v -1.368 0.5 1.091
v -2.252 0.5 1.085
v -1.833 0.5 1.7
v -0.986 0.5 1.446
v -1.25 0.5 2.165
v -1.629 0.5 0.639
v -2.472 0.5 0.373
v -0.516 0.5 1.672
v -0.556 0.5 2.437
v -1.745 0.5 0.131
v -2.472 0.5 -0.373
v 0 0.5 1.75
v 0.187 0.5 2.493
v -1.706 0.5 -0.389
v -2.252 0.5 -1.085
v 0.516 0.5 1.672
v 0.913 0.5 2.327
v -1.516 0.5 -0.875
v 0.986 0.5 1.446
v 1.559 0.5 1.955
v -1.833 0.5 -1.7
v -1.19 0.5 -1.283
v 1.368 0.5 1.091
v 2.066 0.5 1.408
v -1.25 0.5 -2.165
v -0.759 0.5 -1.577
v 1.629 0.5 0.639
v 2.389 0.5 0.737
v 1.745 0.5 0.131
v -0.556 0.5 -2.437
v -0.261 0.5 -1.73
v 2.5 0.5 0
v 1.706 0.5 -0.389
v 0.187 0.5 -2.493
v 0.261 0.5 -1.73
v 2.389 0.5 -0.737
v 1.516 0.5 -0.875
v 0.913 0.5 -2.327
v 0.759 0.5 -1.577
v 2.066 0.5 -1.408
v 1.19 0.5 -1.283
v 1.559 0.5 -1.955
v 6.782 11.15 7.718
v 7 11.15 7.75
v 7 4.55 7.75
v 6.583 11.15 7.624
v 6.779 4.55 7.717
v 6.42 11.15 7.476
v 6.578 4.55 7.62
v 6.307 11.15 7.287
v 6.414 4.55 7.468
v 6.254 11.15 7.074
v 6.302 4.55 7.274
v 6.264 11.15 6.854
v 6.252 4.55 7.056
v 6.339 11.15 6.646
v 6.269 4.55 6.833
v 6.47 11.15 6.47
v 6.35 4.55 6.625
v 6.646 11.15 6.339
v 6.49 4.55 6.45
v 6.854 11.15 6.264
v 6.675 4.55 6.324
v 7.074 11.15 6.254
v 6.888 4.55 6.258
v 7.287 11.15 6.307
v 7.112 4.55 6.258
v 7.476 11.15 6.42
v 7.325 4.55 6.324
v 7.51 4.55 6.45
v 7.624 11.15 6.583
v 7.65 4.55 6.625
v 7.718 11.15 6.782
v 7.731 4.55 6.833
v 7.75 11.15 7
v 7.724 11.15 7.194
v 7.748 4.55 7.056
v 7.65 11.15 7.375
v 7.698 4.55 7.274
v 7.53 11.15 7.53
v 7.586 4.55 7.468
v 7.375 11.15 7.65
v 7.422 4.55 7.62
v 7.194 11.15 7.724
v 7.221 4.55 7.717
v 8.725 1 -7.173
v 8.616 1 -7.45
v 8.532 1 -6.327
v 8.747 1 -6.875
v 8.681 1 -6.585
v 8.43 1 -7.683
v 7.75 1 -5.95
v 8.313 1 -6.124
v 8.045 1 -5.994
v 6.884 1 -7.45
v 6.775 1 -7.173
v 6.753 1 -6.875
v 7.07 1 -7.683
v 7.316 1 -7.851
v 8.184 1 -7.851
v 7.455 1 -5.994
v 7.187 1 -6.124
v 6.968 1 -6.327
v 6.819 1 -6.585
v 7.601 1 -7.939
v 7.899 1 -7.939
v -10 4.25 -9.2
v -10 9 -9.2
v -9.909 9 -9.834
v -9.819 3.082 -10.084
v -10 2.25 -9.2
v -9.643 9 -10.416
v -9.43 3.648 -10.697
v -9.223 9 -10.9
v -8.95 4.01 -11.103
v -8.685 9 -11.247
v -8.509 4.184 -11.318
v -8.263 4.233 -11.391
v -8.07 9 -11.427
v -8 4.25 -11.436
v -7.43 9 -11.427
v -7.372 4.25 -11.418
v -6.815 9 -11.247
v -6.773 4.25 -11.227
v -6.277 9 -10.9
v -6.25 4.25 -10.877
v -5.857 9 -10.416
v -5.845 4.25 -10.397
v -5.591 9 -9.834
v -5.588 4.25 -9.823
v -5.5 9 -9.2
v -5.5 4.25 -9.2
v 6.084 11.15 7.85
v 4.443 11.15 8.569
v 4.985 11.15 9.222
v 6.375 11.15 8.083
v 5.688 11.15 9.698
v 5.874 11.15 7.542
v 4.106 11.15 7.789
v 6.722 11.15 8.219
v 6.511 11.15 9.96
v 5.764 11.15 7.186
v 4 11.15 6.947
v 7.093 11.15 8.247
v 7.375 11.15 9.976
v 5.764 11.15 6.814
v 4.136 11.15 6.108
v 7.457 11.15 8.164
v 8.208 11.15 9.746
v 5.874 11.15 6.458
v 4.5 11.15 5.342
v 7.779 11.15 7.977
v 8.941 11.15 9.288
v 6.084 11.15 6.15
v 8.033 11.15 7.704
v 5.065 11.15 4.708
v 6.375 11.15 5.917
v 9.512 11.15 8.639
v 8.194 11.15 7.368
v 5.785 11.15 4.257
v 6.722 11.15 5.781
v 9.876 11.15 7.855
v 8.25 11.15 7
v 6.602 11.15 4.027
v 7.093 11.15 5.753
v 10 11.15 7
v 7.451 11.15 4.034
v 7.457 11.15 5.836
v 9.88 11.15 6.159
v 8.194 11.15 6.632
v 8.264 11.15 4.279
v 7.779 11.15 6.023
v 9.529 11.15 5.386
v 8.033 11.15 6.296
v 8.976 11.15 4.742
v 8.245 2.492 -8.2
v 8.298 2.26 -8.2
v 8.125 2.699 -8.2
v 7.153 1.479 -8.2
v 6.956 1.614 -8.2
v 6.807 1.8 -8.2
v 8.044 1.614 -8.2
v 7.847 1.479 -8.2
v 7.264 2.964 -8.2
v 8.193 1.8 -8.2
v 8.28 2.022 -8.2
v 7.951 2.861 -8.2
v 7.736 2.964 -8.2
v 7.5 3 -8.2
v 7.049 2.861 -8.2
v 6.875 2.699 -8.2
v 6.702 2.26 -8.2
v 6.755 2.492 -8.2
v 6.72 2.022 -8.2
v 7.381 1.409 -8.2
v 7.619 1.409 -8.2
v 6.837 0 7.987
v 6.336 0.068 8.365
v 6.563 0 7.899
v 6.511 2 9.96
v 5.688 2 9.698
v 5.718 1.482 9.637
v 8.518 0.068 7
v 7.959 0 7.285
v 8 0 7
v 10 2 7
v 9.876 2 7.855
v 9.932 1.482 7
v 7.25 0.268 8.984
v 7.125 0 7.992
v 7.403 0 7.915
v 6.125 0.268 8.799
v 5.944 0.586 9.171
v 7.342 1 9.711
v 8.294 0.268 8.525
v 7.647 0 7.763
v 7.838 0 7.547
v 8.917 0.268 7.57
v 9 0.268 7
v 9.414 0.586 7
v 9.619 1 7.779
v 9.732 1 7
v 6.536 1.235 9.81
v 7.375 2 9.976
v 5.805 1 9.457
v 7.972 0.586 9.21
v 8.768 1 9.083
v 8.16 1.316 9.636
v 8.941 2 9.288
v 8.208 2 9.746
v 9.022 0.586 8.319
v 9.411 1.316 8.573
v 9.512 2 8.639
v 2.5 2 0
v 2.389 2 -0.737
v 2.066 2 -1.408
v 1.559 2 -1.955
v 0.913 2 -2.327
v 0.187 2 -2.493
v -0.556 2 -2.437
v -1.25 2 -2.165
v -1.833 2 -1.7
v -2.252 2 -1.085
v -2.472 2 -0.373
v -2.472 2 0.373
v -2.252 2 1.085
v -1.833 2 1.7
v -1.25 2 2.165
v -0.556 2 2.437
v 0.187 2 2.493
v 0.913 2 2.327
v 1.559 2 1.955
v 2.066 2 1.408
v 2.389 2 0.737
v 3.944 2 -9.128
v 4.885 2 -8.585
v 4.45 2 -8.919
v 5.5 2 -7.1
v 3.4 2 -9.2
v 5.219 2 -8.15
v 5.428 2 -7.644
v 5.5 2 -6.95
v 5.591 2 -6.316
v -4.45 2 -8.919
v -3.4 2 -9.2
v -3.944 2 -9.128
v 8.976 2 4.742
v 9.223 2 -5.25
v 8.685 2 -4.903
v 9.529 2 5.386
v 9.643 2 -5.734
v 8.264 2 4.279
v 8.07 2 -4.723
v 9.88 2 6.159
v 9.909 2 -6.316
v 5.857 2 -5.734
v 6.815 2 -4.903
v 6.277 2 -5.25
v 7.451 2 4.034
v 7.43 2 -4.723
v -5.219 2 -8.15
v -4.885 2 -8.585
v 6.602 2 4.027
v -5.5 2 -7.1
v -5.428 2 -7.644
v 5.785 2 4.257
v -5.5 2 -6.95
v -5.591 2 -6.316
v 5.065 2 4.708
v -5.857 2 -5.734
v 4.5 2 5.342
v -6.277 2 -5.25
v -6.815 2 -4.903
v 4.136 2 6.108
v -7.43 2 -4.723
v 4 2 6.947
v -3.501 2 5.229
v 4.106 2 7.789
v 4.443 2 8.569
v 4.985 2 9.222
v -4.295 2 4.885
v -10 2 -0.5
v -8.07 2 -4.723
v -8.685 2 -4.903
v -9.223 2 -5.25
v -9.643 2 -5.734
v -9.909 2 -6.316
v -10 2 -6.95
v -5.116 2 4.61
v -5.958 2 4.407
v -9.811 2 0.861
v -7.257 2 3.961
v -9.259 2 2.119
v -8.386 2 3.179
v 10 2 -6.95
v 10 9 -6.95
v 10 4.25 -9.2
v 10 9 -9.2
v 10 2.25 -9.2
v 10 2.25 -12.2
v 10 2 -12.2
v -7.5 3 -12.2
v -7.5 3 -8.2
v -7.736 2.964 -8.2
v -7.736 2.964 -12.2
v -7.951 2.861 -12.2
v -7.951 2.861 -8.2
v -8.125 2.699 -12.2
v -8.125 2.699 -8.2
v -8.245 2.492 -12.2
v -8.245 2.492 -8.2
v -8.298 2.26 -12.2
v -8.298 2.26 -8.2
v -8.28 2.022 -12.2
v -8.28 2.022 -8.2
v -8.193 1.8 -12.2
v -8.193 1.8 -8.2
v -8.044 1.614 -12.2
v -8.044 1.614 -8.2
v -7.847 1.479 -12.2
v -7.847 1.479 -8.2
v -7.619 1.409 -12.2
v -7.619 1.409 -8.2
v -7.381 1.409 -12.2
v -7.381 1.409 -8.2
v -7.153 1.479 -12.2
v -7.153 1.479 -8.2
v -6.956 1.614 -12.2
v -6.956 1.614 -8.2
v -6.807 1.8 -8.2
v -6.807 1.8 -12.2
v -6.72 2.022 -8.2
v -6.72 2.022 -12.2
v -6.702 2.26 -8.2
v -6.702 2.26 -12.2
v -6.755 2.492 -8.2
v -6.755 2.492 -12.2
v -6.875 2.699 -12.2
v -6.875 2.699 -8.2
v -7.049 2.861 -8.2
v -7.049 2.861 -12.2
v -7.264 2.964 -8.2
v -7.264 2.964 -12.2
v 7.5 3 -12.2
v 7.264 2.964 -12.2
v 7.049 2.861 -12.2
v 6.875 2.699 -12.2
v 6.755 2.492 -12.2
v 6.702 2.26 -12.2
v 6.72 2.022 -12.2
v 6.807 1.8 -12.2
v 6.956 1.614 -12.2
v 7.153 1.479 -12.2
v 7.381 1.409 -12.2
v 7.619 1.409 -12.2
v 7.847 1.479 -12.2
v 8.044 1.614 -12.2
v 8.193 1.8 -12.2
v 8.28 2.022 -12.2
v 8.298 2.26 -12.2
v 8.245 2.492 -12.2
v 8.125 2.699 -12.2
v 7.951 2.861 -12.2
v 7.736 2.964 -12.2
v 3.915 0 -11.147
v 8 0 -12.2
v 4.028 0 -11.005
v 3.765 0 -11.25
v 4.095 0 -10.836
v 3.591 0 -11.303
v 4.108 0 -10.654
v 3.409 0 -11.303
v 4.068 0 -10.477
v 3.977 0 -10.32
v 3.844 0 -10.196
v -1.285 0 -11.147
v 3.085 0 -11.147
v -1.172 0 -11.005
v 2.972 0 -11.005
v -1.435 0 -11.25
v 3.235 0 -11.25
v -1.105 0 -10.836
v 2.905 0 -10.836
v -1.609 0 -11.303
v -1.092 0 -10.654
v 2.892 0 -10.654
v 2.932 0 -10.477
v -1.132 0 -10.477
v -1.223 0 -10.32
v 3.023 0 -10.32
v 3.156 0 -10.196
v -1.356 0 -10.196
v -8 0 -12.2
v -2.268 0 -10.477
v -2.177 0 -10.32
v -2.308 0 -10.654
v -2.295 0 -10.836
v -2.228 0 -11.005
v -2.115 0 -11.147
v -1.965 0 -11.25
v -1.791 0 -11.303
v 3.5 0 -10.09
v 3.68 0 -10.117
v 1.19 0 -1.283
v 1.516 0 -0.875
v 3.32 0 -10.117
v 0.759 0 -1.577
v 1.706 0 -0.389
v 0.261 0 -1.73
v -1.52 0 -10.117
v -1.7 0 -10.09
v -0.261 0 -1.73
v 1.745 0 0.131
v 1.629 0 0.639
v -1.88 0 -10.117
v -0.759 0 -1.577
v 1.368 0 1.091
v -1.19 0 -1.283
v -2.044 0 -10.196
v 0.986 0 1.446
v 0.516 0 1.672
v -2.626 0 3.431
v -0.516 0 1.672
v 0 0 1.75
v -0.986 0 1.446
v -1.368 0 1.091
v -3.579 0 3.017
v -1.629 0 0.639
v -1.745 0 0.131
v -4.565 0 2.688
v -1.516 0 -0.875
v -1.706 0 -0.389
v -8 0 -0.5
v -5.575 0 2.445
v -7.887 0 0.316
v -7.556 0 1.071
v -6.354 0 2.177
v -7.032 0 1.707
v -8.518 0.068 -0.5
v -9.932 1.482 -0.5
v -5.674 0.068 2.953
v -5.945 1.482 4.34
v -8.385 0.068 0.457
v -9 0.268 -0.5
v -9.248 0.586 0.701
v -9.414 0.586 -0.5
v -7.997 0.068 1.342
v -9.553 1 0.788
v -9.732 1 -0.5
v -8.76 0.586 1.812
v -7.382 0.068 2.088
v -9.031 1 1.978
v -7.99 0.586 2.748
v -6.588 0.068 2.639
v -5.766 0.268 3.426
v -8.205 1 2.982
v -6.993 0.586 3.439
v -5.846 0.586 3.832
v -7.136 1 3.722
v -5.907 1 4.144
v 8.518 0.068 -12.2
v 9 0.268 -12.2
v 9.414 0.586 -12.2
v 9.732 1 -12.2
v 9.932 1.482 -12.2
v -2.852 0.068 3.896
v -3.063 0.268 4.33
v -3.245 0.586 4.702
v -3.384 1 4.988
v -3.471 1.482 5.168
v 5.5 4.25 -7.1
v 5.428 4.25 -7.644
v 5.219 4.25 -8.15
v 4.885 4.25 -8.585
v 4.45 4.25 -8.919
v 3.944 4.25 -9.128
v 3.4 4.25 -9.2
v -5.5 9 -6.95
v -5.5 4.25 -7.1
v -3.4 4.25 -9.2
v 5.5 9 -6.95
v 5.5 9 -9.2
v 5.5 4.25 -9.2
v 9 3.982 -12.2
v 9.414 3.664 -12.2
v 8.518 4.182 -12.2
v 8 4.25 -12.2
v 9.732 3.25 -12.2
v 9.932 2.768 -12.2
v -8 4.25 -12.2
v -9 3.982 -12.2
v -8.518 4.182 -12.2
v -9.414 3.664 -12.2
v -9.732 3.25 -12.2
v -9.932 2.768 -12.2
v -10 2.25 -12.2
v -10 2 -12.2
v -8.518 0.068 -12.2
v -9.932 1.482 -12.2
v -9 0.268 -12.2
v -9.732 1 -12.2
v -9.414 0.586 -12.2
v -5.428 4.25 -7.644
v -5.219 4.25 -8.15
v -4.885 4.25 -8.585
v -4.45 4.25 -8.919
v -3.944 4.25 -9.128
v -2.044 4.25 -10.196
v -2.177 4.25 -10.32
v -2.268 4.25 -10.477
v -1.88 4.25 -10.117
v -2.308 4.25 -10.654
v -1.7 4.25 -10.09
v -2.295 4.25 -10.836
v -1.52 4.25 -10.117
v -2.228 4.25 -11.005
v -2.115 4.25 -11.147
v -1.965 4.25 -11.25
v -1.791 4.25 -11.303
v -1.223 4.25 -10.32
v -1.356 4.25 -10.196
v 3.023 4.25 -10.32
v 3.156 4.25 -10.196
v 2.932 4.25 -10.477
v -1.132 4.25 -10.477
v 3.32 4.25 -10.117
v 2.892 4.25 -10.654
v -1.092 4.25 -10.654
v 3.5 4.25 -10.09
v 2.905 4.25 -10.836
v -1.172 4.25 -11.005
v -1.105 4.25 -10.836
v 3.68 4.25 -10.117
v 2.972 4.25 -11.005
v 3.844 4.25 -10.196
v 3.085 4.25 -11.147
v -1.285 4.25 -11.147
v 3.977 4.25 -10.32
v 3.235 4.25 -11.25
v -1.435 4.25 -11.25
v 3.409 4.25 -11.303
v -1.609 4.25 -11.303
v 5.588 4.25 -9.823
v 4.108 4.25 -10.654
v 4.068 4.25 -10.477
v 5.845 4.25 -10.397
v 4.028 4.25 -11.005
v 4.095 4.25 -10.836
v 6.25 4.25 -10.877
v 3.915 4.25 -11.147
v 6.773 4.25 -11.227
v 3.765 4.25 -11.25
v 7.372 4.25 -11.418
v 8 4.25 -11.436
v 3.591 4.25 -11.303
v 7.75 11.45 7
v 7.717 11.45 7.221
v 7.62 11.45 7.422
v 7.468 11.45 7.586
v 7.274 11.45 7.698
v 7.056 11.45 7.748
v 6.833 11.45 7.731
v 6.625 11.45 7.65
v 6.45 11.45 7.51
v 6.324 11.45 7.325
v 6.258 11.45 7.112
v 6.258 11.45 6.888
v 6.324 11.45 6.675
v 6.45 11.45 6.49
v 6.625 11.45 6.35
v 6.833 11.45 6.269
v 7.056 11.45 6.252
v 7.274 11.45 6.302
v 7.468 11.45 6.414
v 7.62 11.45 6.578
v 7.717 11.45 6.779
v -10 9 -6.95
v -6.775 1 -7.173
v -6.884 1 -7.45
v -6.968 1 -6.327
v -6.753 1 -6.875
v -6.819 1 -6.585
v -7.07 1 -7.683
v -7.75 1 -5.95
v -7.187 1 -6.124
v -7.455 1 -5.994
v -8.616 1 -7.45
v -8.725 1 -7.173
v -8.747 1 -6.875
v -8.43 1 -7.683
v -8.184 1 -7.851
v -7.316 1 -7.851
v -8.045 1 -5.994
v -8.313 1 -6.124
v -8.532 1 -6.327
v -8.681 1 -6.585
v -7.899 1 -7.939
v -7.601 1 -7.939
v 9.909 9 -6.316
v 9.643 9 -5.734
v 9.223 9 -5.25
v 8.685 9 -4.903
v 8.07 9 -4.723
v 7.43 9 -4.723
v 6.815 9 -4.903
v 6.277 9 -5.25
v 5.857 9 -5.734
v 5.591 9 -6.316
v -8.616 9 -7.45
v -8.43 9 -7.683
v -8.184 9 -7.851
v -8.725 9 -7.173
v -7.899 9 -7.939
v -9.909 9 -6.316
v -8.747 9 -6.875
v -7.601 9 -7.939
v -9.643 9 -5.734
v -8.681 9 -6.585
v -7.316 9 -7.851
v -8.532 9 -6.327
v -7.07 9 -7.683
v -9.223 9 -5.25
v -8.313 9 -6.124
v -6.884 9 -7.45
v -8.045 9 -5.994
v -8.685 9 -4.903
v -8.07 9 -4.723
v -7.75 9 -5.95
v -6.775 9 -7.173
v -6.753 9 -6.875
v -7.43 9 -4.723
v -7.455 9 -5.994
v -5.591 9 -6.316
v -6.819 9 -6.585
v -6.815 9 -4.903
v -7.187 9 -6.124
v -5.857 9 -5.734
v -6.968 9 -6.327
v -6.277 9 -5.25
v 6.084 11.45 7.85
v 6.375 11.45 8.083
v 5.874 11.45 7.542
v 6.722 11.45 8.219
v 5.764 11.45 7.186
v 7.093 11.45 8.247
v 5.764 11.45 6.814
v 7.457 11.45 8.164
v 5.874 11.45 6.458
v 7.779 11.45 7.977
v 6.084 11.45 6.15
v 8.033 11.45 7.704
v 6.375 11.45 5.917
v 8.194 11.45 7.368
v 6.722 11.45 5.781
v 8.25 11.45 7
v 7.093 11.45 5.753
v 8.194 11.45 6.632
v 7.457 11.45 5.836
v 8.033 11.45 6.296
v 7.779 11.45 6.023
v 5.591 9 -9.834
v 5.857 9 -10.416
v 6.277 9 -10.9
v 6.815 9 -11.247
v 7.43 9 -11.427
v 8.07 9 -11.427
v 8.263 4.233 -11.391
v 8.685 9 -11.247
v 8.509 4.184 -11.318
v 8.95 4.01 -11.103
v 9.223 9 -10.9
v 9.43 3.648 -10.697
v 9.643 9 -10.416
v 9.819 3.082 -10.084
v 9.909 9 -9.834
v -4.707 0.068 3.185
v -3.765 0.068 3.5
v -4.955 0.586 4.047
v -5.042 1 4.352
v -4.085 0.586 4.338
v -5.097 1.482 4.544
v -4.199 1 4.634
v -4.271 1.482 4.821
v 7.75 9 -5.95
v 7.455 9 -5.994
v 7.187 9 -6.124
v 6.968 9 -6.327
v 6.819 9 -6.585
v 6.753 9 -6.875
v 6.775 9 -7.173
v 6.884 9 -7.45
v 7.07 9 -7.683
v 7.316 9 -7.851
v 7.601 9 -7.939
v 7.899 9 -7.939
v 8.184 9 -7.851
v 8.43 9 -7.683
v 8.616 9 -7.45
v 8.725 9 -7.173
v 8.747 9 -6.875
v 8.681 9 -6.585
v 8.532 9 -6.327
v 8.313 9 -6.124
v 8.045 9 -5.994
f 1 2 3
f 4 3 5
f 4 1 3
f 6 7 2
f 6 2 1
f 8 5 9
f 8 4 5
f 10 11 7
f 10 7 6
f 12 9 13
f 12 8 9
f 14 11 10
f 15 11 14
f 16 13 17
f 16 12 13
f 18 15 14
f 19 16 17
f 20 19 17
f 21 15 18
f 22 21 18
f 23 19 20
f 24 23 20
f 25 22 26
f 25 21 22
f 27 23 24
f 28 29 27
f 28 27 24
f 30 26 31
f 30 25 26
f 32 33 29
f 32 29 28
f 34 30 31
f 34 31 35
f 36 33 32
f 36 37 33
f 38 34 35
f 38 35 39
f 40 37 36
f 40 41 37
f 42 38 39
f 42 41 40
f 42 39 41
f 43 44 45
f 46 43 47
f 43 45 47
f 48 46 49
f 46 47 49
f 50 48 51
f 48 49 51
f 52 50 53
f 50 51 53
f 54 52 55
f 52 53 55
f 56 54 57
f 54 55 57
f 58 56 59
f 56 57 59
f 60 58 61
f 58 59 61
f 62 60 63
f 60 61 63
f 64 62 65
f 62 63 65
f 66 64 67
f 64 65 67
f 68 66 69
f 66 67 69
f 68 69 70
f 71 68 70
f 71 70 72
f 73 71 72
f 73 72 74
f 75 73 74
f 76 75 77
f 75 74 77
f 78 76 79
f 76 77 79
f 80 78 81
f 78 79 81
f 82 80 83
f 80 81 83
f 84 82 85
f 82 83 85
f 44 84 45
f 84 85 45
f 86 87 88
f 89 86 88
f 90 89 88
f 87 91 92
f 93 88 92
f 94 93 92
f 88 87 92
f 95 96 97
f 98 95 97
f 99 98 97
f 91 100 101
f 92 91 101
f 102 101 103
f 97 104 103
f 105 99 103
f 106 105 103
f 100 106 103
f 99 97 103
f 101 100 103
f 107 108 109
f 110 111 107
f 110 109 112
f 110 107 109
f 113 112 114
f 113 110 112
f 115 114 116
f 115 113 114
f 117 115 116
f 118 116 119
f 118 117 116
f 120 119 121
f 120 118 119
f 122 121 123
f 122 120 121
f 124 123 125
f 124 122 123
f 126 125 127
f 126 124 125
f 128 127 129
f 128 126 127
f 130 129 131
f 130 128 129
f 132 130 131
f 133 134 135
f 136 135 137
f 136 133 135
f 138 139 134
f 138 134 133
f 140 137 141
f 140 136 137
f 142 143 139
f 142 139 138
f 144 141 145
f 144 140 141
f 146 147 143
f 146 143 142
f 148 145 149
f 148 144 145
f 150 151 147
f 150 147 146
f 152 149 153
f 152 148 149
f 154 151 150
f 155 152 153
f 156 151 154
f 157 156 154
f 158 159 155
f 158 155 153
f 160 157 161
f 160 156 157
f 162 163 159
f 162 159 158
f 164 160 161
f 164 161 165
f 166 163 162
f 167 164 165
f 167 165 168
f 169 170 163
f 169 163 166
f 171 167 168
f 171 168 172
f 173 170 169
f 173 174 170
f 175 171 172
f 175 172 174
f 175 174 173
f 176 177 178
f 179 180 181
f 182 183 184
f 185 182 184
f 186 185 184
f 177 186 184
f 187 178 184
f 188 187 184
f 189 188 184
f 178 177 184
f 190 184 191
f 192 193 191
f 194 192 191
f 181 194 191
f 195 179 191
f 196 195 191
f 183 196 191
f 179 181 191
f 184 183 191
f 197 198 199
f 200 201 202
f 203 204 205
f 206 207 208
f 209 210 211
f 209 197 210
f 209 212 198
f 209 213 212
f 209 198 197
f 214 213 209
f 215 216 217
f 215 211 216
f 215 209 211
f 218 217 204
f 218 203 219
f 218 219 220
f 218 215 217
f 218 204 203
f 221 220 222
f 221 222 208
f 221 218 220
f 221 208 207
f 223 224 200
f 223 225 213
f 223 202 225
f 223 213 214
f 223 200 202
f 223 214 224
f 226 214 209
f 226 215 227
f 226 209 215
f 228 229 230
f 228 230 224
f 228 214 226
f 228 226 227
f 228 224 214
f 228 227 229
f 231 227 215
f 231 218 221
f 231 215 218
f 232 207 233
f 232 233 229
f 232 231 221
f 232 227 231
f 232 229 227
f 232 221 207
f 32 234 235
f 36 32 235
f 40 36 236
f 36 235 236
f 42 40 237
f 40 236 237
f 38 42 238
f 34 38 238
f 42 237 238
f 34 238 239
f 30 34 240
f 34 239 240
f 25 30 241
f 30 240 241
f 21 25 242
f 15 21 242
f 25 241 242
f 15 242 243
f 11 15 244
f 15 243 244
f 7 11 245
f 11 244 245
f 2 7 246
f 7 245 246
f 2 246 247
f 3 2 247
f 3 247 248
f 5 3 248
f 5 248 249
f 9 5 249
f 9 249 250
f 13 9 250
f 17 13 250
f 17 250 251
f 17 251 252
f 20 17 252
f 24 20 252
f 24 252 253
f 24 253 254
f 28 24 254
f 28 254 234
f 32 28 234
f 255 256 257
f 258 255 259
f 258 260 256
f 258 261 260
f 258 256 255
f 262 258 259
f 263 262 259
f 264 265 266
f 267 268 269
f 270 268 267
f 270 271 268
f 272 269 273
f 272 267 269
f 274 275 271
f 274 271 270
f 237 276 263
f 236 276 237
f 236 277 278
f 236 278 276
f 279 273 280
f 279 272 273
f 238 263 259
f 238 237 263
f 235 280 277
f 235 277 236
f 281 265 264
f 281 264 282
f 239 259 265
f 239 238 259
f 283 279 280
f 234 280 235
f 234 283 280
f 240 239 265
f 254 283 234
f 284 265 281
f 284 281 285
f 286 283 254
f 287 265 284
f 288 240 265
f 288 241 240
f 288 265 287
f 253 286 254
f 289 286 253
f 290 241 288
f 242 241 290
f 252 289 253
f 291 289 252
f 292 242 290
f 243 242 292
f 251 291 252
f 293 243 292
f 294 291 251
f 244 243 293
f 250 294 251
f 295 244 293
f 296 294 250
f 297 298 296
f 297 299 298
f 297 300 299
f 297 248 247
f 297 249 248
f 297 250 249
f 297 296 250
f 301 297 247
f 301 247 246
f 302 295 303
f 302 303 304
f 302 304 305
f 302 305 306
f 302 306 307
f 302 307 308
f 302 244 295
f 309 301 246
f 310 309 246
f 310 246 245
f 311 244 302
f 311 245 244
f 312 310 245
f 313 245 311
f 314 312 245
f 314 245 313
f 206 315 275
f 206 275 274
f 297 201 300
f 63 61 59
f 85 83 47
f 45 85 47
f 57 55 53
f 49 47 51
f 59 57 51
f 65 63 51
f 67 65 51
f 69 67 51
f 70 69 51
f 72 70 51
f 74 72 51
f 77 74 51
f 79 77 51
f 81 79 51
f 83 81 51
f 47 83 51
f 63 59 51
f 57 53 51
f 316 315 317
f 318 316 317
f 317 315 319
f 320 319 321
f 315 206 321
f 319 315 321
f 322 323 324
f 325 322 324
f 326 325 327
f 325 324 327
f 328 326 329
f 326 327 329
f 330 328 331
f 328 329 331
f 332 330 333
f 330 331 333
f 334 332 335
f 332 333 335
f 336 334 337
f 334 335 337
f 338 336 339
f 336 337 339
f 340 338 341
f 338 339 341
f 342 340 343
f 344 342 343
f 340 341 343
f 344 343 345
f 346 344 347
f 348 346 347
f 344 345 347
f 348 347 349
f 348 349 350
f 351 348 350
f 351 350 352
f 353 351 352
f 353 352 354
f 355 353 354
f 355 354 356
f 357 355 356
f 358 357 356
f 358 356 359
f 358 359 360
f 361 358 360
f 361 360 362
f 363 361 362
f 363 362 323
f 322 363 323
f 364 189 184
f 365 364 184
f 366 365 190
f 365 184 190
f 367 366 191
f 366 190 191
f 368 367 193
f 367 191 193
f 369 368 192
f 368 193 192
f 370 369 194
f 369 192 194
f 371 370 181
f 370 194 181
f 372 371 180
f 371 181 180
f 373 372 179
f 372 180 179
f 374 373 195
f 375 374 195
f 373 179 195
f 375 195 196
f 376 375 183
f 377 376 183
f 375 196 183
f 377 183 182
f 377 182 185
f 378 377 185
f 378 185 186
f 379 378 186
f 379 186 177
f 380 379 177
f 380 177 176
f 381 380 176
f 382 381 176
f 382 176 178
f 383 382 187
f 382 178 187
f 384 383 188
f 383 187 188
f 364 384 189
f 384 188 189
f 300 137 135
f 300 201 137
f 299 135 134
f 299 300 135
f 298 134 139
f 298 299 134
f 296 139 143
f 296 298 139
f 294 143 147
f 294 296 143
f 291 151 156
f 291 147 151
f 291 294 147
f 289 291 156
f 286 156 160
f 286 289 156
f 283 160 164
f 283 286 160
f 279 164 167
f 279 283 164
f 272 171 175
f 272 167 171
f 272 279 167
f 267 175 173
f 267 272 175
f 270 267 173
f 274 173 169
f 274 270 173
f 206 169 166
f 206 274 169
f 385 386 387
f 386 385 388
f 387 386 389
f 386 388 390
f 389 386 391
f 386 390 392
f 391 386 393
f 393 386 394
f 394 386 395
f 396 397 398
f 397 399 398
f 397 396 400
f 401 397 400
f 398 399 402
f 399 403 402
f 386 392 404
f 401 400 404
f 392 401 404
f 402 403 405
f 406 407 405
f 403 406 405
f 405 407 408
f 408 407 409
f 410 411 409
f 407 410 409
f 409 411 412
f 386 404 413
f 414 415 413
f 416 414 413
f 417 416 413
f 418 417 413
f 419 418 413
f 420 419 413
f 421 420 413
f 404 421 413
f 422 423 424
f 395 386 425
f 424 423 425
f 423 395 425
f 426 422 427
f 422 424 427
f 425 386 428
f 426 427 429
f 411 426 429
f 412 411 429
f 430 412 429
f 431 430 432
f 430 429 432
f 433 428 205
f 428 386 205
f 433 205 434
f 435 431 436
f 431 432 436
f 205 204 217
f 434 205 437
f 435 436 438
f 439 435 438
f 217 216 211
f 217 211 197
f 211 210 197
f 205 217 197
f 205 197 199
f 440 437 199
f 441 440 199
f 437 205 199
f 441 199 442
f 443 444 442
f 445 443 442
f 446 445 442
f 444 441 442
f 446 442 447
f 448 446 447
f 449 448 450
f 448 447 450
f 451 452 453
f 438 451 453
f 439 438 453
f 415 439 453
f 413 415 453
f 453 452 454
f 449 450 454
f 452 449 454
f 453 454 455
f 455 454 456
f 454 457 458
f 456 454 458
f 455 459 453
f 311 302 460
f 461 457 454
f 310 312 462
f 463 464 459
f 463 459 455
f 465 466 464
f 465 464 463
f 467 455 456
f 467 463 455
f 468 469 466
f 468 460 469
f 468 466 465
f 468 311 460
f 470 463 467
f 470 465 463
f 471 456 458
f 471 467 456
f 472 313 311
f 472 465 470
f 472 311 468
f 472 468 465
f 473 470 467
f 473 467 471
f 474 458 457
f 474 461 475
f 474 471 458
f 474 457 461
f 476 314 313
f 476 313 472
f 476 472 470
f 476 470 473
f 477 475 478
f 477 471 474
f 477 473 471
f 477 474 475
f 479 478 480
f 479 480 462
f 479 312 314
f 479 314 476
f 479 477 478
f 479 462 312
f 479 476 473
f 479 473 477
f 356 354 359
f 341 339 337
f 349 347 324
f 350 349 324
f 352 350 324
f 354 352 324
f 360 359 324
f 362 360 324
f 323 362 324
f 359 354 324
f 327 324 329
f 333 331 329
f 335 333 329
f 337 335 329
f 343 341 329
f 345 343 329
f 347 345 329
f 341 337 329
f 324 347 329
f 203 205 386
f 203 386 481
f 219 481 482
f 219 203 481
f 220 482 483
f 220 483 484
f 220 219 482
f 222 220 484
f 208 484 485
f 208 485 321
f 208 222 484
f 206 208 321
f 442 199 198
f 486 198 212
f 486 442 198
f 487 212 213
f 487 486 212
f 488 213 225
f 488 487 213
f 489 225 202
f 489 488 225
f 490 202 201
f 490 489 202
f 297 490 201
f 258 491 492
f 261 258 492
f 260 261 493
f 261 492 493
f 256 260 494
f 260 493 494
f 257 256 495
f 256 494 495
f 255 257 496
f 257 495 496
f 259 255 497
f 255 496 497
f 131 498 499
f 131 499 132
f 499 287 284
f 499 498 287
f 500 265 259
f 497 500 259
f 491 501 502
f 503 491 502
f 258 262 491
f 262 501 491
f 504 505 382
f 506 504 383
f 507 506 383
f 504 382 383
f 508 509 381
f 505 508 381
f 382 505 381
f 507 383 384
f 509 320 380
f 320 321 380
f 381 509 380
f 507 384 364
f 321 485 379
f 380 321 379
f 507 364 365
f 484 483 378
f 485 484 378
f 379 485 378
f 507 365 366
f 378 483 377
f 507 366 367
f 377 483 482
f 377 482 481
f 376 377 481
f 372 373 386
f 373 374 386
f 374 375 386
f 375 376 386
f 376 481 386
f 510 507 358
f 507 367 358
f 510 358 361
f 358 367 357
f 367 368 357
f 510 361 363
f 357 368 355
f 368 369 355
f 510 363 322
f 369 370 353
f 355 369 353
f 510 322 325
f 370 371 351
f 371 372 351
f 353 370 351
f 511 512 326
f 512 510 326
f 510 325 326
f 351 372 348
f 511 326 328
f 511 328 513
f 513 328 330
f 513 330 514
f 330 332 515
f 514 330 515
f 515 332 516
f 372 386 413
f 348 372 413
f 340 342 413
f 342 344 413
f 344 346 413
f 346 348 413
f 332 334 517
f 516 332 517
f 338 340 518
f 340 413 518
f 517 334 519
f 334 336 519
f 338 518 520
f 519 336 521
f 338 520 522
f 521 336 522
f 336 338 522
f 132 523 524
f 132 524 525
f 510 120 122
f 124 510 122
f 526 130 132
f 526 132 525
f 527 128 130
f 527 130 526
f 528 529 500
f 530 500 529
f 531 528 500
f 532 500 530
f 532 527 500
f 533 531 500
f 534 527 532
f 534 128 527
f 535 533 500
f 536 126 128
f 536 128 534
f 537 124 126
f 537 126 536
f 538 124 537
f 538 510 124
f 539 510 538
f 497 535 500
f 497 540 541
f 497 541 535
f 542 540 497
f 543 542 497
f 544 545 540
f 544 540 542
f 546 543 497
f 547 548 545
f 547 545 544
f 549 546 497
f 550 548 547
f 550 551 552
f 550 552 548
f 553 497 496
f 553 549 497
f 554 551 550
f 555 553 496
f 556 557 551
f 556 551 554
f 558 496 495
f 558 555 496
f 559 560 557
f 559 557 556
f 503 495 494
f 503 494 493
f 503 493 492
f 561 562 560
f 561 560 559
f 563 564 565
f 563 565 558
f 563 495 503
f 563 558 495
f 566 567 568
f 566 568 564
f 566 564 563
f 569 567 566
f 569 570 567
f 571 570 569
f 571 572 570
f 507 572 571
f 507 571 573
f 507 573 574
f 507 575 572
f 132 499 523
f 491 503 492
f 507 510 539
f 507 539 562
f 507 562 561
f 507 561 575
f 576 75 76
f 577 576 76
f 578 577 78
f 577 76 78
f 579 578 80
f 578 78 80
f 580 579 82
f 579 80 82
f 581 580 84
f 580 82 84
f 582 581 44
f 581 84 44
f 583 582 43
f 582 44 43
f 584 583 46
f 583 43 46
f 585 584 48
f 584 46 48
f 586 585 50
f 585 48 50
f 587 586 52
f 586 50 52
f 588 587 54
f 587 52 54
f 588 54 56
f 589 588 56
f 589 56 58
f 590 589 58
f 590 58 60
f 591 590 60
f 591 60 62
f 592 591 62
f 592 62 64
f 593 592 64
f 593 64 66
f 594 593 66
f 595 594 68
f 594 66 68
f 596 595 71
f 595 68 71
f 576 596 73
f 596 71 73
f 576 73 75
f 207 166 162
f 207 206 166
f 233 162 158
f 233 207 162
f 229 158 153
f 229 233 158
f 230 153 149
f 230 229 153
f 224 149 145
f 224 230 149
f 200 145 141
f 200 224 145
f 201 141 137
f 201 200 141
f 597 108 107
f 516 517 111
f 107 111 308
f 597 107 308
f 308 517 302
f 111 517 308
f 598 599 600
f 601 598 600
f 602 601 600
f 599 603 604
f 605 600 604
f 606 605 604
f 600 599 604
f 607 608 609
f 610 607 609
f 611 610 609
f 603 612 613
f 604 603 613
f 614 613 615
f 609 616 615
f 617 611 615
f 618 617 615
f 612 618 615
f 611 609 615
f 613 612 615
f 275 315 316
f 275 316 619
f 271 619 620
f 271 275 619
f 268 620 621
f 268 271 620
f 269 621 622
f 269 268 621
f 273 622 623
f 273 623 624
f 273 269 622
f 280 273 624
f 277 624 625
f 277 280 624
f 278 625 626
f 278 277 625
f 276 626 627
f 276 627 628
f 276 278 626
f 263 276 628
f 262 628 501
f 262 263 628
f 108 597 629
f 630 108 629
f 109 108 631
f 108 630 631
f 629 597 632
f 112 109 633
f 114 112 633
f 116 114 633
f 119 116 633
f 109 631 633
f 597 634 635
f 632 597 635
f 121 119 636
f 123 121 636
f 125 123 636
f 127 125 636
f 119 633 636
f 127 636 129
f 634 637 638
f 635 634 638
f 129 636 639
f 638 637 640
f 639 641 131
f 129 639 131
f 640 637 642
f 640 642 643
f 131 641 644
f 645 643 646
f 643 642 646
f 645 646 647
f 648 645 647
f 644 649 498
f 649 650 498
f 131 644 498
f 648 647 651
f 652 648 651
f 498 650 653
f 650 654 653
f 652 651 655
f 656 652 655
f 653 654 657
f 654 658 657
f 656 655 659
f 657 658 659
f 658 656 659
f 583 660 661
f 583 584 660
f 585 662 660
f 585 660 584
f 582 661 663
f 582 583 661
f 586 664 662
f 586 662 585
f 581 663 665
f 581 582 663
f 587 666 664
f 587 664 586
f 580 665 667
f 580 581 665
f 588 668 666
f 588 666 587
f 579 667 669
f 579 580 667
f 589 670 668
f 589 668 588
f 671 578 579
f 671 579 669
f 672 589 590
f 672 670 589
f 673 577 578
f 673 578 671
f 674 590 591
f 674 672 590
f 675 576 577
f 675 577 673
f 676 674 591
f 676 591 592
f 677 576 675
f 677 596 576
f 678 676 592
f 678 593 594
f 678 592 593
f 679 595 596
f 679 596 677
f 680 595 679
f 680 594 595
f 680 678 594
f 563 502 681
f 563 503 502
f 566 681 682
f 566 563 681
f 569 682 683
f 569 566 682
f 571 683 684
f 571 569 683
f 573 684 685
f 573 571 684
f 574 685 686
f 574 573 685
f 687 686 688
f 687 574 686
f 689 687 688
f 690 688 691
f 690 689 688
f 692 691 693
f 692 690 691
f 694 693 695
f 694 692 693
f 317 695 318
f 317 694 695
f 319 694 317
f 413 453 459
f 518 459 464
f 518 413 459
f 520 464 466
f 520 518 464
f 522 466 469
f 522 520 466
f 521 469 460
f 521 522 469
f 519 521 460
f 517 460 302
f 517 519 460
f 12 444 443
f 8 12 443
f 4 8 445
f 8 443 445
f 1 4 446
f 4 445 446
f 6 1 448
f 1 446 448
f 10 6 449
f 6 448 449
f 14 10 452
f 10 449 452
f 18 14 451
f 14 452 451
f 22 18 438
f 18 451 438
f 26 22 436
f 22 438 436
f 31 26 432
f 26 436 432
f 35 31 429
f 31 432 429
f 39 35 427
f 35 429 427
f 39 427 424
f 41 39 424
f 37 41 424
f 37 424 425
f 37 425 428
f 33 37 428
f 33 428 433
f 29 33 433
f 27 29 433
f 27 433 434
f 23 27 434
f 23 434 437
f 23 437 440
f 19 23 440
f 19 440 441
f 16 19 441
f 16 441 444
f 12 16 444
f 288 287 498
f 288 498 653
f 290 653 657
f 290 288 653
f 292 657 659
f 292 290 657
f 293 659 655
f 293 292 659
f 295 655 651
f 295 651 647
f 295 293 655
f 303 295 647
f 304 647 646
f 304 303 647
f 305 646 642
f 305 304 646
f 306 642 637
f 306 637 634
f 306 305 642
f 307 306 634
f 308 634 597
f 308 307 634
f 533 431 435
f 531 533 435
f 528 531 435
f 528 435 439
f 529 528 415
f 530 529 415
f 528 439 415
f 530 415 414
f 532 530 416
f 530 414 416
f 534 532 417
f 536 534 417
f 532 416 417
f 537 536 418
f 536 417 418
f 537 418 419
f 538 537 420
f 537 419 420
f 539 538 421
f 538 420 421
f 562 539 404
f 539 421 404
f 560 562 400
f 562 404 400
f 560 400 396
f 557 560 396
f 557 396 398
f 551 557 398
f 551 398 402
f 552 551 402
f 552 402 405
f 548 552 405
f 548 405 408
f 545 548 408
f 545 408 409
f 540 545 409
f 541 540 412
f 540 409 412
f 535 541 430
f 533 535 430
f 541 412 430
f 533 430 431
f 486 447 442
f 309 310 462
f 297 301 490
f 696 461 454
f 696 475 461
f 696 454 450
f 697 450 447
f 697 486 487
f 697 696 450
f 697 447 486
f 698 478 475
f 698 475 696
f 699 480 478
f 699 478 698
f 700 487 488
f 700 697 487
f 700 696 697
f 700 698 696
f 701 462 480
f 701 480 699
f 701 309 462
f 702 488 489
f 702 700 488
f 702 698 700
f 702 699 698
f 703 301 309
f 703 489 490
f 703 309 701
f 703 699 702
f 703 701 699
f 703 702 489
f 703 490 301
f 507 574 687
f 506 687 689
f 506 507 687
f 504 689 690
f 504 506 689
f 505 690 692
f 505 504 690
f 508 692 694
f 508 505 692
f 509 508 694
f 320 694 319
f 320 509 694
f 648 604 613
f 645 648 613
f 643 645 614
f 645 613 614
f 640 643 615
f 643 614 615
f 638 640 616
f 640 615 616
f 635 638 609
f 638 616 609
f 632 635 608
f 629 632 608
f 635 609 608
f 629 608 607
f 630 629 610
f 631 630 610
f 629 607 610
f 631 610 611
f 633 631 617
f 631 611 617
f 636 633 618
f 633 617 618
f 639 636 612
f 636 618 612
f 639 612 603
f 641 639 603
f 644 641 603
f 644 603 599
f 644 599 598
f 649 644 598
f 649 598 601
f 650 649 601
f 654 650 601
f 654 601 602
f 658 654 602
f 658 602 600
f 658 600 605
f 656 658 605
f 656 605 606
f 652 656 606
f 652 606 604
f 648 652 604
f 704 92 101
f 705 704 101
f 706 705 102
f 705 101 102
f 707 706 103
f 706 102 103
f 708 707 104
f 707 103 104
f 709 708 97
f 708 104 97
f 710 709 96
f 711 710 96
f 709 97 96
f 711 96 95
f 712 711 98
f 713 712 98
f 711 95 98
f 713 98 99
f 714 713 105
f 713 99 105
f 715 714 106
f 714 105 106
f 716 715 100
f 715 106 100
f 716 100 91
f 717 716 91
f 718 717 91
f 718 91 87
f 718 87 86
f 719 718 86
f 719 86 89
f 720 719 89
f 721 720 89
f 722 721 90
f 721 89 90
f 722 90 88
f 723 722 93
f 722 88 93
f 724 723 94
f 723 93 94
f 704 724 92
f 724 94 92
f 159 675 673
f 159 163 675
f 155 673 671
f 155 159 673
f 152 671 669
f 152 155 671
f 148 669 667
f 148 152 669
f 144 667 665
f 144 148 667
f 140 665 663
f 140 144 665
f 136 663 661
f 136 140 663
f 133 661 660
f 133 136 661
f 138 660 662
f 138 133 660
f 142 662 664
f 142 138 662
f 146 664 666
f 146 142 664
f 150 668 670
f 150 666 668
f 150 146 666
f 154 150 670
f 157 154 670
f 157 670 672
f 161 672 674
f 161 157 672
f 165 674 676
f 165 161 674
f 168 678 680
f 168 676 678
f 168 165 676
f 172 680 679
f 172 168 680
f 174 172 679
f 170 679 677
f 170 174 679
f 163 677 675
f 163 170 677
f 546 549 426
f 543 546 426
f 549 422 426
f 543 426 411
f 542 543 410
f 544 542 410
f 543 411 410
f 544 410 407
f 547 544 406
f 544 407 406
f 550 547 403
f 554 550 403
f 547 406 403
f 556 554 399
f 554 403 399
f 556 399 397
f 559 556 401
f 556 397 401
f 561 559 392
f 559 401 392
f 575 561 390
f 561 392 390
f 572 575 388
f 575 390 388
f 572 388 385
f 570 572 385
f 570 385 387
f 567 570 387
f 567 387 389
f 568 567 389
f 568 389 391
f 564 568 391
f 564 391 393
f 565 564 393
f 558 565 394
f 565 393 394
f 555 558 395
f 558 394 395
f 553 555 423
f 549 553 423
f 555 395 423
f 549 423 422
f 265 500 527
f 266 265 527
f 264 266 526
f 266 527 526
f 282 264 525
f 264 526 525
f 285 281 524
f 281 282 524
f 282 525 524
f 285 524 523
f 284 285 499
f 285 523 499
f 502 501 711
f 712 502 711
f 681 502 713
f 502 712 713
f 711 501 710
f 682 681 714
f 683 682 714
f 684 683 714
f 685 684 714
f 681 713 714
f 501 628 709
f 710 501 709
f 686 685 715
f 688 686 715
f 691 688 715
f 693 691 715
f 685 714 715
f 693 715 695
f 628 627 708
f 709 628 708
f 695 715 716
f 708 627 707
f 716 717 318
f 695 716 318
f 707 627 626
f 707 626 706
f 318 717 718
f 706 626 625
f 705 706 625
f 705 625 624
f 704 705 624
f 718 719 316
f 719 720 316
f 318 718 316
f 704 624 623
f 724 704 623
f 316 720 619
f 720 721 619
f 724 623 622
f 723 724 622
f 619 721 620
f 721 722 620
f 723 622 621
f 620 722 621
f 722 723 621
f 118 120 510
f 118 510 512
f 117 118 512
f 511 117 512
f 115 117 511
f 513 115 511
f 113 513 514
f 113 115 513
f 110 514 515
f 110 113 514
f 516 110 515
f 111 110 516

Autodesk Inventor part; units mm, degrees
ref_plane "YZ Plane" through (0, 0, 0) normal (1, 0, 0) x (0, 1, 0)
ref_plane "XZ Plane" through (0, 0, 0) normal (0, 1, 0) x (-1, 0, 0)
ref_plane "XY Plane" through (0, 0, 0) normal (0, 0, 1) x (1, 0, 0)
sketch "Sketch1" plane through (0, 0, 0) normal (0, 1, 0) x (-1, 0, 0)
  line L0 (-5, 4.5) -> (5, 4.5)
  line L1 (10, -0.5) -> (10, -12.2)
  line L2 (10, -12.2) -> (-10, -12.2)
  line L3 (-10, -12.2) -> (-10, -0.5)
  line L4 (0, 0) -> (0, -71.875) construction
  arc A0 (10, -0.5) -> (5, 4.5) centre (5, -0.5) ccw
  arc A1 (-5, 4.5) -> (-10, -0.5) centre (-5, -0.5) ccw
  point P0 (-10, 4.5)
  point P1 (10, 4.5)
  dimension "d0" = 20
  dimension "d1" = 12.2
  dimension "d2" = 4.5
  dimension "d28" = 5
extrude "Extrusion1" add sketch "Sketch1" along normal blind 2
sketch "Sketch2" plane through (0, 2, 0) normal (0, 1, 0) x (1, 0, 0)
  circle A0 centre (0, 0) radius 2.5
  dimension "d6" = 5
extrude "Extrusion2" cut sketch "Sketch2" against normal blind 1.5
hole "Hole1" at (0, 0.5, 0) direction (0, -1, 0) diameter 3.5 end through all
sketch "Sketch7" plane through (0, 2, 0) normal (0, 1, 0) x (1, 0, 0)
  line L0 (15, 10.7) -> (-18, 10.7) construction
  line L1 (3.5, 10.7) -> (-1.7, 10.7) construction
  circle A0 centre (0, 0) radius 2.5 projected
  line L2 (-10, 12.2) -> (-10, 0.5) projected
  arc A1 (-10, 0.5) -> (-5, -4.5) centre (-5, 0.5) ccw projected
  line L3 (-5, -4.5) -> (5, -4.5) projected
  arc A2 (5, -4.5) -> (10, 0.5) centre (5, 0.5) ccw projected
  line L4 (10, 0.5) -> (10, 12.2) projected
  line L5 (10, 12.2) -> (-10, 12.2) projected
  line L6 (10, 12.2) -> (-10, 12.2)
  line L7 (-10, 12.2) -> (-10, 9.2)
  line L8 (-10, 9.2) -> (10, 9.2)
  line L9 (10, 9.2) -> (10, 12.2)
  dimension "d44" = 10.7
  dimension "d57" = 3
extrude "Extrusion5" add sketch "Sketch7" along normal blind 2.25 contours L5 L4 L8 L2
sketch "Sketch9" plane through (0, 4.25, 0) normal (0, 1, 0) x (1, 0, 0)
  line L0 (-10, 12.2) -> (-10, 9.2) projected
  line L1 (-10, 9.2) -> (10, 9.2) projected
  line L2 (10, 9.2) -> (10, 12.2) projected
  line L3 (10, 12.2) -> (-10, 12.2) projected
  line L4 (0, 0) -> (0, 12.2) construction
  line L5 (-10, 10.7) -> (10, 10.7) construction
  line L6 (10, 0.5) -> (10, 12.2) projected
  point P0 (-1.7, 10.7)
  point P1 (3.5, 10.7)
  dimension "d58" = 3.5
  dimension "d59" = 1.7
hole "Hole5" at (-1.7, 4.25, -10.7) at (3.5, 4.25, -10.7) direction (0, -1, 0) diameter 1.22 end through all
sketch "Sketch10" plane through (0, 0, 0) normal (0, -1, 0) x (1, 0, 0)
  circle A0 centre (-1.7, -10.7) radius 0.61 projected
  circle A1 centre (3.5, -10.7) radius 0.61 projected
  circle A2 centre (0, 0) radius 1.75 projected
  line L0 (-10, -12.2) -> (-10, -0.5) projected
  line L1 (10, -12.2) -> (-10, -12.2) projected
  line L2 (10, -0.5) -> (10, -12.2) projected
  arc A3 (10, -0.5) -> (5, 4.5) centre (5, -0.5) ccw projected
  line L3 (-5, 4.5) -> (5, 4.5) projected
  arc A4 (-5, 4.5) -> (-10, -0.5) centre (-5, -0.5) ccw projected
  line L4 (10, -0.5) -> (10, -9.2) projected
  line L5 (10, -6.95) -> (-10, -6.95) construction
  line L6 (-10, -12.2) -> (-10, -0.5) projected
  line L7 (0, 0) -> (0, -12.2) construction
  arc A5 (10, -6.95) -> (5.5, -6.95) centre (7.75, -6.95) ccw
  arc A6 (-5.5, -6.95) -> (-10, -6.95) centre (-7.75, -6.95) ccw
  line L8 (-10, -9.2) -> (10, -9.2) projected
  line L9 (10, -9.2) -> (-10, -9.2) projected
  arc A7 (5.5, -9.2) -> (10, -9.2) centre (7.75, -9.2) ccw
  line L10 (10, -6.95) -> (10, -9.2)
  line L11 (5.5, -6.95) -> (5.5, -9.2)
  line L12 (-10, -9.2) -> (-10, -6.95)
  line L13 (-5.5, -6.95) -> (-5.5, -9.2)
  circle A8 centre (-7.75, -9.2) radius 2.25
  circle A9 centre (7.75, -9.2) radius 2.25
  dimension "d67" = 5.25
  dimension "d68" = 2.25
sketch "Sketch12" plane through (0, 0, 0) normal (0, -1, 0) x (1, 0, 0)
  circle A0 centre (-1.7, -10.7) radius 0.61 projected
  circle A1 centre (3.5, -10.7) radius 0.61 projected
  circle A2 centre (0, 0) radius 1.75 projected
  line L0 (-10, -12.2) -> (-10, -0.5) projected
  line L1 (10, -12.2) -> (-10, -12.2) projected
  line L2 (10, -0.5) -> (10, -12.2) projected
  arc A3 (10, -0.5) -> (5, 4.5) centre (5, -0.5) ccw projected
  line L3 (-5, 4.5) -> (5, 4.5) projected
  arc A4 (-5, 4.5) -> (-10, -0.5) centre (-5, -0.5) ccw projected
  circle A5 centre (7, 7) radius 3
  line L4 (10, -0.5) -> (10, -12.2) projected
  line L5 (10, -0.5) -> (10, 7)
  arc A6 (10, -0.5) -> (5, 4.5) centre (5, -0.5) ccw projected
  line L6 (-5, 4.5) -> (5.6879, 9.6979)
  line L7 (-5, 4.5) -> (5, 4.5) projected
  dimension "d86" = 7
  dimension "d87" = 7
extrude "Extrusion6" add sketch "Sketch12" against normal up to surface (2 mm away) contours L6 A5 A3 L3 | A3 A5 L5 | A5 A3 | A5 A3
fillet "Fillet2" radius 10 1 edges at (-5, 1, 4.5)
sketch "Sketch13" plane through (0, 2, 0) normal (0, 1, 0) x (1, 0, 0)
  arc A0 (5.6879, -9.6979) -> (10, -7) centre (7, -7) ccw projected
  circle A1 centre (7, -7) radius 3
  point P0 (0, 0)
extrude "Extrusion7" add sketch "Sketch13" along normal blind 9.15
hole "Hole8" at (7, 11.15, 7) direction (0, -1, 0) diameter 1.5 depth 6.6
sketch "Sketch14" plane through (7, 11.15, 7) normal (0, 1, 0) x (1, 0, 0)
  circle A0 centre (0, 0) radius 0.75 projected
  circle A1 centre (0, 0) radius 3 projected
  circle A2 centre (0, 0) radius 1.25
  point P0 (-7, 7)
  dimension "d102" = 2.5
extrude "Extrusion8" add sketch "Sketch14" along normal blind 0.3 contours A2
extrude "Extrusion9" add sketch "Sketch10" against normal blind 9 contours A8 L8 | L0 A6 L13 A8 | L8 A8 | A9 L11 A5 L2 | A7 L8 | L8 A9
sketch "Sketch11" plane through (10, 0, -12.2) normal (0, 0, -1) x (-1, 0, 0)
  line L0 (10, 0) -> (10, 4.25) construction
  line L1 (0, 0) -> (20, 0) projected
  line L2 (20, 0) -> (20, 4.25) projected
  line L3 (0, 4.25) -> (20, 4.25) projected
  line L4 (0, 0) -> (0, 4.25) projected
  line L5 (0, 0) -> (0, 4.25) projected
  line L6 (0, 2.2) -> (20, 2.2) construction
  point P0 (2.5, 2.2)
  point P1 (17.5, 2.2)
  dimension "d77" = 2.2
  dimension "d78" = 15
hole "Hole7" at (7.5, 2.2, -12.2) at (-7.5, 2.2, -12.2) direction (0, 0, 1) diameter 1.6 depth 4
sketch "Sketch15" plane through (0, 9, 0) normal (0, 1, 0) x (1, 0, 0)
  arc A0 (5.5, 6.95) -> (10, 6.95) centre (7.75, 6.95) ccw projected
  arc A1 (-10, 6.95) -> (-5.5, 6.95) centre (-7.75, 6.95) ccw projected
  point P0 (0, 0)
hole "Hole9" at (7.75, 9, -6.95) at (-7.75, 9, -6.95) direction (0, -1, 0) diameter 2 depth 8
fillet "Fillet3" radius 2.1 2 edges at (-5.5, 3.125, -9.2) (5.5, 3.125, -9.2)
fillet "Fillet4" radius 2 9 edges at (8.5912, 0, 9.5432) (1.0936, 0, 7.4635) (-4.7027, 0, 4.7383) (-8.8594, 0, 2.6788) (-10, 0, -3.725) (-10, 0, -10.7) (10, 0, -10.7) (10, 4.25, -10.7) (-10, 4.25, -10.7)
equation "\"d44\" = shaft_to_encoder_mount_points"
equation "\"d48\" = encoder_mount_height"
equation "\"d58\" = encoder_mount_point_1"
equation "\"d59\" = encoder_mount_point_2"
equation "\"d67\" = dist_screw_mount_point_1"
equation "\"d68\" = dist_screw_mount_point_2"
equation "\"d77\" = fingertip_mounting_dist_from_edge"
equation "\"d78\" = fingertip_mount_spacing"
equation "\"shaft_to_encoder_mount_points\" = 10.7"
equation "\"encoder_mount_point_1\" = 3.5"
equation "\"encoder_mount_point_2\" = 1.7"
equation "\"dist_screw_mount_point_1\" = 5.25"
equation "\"dist_screw_mount_point_2\" = 2.25"
equation "\"fingertip_mount_spacing\" = 15"
equation "\"encoder_mount_height\" = 2.25"
equation "\"fingertip_mounting_dist_from_edge\" = 2.2"
properties part number "phalanx_3_housing_R"
